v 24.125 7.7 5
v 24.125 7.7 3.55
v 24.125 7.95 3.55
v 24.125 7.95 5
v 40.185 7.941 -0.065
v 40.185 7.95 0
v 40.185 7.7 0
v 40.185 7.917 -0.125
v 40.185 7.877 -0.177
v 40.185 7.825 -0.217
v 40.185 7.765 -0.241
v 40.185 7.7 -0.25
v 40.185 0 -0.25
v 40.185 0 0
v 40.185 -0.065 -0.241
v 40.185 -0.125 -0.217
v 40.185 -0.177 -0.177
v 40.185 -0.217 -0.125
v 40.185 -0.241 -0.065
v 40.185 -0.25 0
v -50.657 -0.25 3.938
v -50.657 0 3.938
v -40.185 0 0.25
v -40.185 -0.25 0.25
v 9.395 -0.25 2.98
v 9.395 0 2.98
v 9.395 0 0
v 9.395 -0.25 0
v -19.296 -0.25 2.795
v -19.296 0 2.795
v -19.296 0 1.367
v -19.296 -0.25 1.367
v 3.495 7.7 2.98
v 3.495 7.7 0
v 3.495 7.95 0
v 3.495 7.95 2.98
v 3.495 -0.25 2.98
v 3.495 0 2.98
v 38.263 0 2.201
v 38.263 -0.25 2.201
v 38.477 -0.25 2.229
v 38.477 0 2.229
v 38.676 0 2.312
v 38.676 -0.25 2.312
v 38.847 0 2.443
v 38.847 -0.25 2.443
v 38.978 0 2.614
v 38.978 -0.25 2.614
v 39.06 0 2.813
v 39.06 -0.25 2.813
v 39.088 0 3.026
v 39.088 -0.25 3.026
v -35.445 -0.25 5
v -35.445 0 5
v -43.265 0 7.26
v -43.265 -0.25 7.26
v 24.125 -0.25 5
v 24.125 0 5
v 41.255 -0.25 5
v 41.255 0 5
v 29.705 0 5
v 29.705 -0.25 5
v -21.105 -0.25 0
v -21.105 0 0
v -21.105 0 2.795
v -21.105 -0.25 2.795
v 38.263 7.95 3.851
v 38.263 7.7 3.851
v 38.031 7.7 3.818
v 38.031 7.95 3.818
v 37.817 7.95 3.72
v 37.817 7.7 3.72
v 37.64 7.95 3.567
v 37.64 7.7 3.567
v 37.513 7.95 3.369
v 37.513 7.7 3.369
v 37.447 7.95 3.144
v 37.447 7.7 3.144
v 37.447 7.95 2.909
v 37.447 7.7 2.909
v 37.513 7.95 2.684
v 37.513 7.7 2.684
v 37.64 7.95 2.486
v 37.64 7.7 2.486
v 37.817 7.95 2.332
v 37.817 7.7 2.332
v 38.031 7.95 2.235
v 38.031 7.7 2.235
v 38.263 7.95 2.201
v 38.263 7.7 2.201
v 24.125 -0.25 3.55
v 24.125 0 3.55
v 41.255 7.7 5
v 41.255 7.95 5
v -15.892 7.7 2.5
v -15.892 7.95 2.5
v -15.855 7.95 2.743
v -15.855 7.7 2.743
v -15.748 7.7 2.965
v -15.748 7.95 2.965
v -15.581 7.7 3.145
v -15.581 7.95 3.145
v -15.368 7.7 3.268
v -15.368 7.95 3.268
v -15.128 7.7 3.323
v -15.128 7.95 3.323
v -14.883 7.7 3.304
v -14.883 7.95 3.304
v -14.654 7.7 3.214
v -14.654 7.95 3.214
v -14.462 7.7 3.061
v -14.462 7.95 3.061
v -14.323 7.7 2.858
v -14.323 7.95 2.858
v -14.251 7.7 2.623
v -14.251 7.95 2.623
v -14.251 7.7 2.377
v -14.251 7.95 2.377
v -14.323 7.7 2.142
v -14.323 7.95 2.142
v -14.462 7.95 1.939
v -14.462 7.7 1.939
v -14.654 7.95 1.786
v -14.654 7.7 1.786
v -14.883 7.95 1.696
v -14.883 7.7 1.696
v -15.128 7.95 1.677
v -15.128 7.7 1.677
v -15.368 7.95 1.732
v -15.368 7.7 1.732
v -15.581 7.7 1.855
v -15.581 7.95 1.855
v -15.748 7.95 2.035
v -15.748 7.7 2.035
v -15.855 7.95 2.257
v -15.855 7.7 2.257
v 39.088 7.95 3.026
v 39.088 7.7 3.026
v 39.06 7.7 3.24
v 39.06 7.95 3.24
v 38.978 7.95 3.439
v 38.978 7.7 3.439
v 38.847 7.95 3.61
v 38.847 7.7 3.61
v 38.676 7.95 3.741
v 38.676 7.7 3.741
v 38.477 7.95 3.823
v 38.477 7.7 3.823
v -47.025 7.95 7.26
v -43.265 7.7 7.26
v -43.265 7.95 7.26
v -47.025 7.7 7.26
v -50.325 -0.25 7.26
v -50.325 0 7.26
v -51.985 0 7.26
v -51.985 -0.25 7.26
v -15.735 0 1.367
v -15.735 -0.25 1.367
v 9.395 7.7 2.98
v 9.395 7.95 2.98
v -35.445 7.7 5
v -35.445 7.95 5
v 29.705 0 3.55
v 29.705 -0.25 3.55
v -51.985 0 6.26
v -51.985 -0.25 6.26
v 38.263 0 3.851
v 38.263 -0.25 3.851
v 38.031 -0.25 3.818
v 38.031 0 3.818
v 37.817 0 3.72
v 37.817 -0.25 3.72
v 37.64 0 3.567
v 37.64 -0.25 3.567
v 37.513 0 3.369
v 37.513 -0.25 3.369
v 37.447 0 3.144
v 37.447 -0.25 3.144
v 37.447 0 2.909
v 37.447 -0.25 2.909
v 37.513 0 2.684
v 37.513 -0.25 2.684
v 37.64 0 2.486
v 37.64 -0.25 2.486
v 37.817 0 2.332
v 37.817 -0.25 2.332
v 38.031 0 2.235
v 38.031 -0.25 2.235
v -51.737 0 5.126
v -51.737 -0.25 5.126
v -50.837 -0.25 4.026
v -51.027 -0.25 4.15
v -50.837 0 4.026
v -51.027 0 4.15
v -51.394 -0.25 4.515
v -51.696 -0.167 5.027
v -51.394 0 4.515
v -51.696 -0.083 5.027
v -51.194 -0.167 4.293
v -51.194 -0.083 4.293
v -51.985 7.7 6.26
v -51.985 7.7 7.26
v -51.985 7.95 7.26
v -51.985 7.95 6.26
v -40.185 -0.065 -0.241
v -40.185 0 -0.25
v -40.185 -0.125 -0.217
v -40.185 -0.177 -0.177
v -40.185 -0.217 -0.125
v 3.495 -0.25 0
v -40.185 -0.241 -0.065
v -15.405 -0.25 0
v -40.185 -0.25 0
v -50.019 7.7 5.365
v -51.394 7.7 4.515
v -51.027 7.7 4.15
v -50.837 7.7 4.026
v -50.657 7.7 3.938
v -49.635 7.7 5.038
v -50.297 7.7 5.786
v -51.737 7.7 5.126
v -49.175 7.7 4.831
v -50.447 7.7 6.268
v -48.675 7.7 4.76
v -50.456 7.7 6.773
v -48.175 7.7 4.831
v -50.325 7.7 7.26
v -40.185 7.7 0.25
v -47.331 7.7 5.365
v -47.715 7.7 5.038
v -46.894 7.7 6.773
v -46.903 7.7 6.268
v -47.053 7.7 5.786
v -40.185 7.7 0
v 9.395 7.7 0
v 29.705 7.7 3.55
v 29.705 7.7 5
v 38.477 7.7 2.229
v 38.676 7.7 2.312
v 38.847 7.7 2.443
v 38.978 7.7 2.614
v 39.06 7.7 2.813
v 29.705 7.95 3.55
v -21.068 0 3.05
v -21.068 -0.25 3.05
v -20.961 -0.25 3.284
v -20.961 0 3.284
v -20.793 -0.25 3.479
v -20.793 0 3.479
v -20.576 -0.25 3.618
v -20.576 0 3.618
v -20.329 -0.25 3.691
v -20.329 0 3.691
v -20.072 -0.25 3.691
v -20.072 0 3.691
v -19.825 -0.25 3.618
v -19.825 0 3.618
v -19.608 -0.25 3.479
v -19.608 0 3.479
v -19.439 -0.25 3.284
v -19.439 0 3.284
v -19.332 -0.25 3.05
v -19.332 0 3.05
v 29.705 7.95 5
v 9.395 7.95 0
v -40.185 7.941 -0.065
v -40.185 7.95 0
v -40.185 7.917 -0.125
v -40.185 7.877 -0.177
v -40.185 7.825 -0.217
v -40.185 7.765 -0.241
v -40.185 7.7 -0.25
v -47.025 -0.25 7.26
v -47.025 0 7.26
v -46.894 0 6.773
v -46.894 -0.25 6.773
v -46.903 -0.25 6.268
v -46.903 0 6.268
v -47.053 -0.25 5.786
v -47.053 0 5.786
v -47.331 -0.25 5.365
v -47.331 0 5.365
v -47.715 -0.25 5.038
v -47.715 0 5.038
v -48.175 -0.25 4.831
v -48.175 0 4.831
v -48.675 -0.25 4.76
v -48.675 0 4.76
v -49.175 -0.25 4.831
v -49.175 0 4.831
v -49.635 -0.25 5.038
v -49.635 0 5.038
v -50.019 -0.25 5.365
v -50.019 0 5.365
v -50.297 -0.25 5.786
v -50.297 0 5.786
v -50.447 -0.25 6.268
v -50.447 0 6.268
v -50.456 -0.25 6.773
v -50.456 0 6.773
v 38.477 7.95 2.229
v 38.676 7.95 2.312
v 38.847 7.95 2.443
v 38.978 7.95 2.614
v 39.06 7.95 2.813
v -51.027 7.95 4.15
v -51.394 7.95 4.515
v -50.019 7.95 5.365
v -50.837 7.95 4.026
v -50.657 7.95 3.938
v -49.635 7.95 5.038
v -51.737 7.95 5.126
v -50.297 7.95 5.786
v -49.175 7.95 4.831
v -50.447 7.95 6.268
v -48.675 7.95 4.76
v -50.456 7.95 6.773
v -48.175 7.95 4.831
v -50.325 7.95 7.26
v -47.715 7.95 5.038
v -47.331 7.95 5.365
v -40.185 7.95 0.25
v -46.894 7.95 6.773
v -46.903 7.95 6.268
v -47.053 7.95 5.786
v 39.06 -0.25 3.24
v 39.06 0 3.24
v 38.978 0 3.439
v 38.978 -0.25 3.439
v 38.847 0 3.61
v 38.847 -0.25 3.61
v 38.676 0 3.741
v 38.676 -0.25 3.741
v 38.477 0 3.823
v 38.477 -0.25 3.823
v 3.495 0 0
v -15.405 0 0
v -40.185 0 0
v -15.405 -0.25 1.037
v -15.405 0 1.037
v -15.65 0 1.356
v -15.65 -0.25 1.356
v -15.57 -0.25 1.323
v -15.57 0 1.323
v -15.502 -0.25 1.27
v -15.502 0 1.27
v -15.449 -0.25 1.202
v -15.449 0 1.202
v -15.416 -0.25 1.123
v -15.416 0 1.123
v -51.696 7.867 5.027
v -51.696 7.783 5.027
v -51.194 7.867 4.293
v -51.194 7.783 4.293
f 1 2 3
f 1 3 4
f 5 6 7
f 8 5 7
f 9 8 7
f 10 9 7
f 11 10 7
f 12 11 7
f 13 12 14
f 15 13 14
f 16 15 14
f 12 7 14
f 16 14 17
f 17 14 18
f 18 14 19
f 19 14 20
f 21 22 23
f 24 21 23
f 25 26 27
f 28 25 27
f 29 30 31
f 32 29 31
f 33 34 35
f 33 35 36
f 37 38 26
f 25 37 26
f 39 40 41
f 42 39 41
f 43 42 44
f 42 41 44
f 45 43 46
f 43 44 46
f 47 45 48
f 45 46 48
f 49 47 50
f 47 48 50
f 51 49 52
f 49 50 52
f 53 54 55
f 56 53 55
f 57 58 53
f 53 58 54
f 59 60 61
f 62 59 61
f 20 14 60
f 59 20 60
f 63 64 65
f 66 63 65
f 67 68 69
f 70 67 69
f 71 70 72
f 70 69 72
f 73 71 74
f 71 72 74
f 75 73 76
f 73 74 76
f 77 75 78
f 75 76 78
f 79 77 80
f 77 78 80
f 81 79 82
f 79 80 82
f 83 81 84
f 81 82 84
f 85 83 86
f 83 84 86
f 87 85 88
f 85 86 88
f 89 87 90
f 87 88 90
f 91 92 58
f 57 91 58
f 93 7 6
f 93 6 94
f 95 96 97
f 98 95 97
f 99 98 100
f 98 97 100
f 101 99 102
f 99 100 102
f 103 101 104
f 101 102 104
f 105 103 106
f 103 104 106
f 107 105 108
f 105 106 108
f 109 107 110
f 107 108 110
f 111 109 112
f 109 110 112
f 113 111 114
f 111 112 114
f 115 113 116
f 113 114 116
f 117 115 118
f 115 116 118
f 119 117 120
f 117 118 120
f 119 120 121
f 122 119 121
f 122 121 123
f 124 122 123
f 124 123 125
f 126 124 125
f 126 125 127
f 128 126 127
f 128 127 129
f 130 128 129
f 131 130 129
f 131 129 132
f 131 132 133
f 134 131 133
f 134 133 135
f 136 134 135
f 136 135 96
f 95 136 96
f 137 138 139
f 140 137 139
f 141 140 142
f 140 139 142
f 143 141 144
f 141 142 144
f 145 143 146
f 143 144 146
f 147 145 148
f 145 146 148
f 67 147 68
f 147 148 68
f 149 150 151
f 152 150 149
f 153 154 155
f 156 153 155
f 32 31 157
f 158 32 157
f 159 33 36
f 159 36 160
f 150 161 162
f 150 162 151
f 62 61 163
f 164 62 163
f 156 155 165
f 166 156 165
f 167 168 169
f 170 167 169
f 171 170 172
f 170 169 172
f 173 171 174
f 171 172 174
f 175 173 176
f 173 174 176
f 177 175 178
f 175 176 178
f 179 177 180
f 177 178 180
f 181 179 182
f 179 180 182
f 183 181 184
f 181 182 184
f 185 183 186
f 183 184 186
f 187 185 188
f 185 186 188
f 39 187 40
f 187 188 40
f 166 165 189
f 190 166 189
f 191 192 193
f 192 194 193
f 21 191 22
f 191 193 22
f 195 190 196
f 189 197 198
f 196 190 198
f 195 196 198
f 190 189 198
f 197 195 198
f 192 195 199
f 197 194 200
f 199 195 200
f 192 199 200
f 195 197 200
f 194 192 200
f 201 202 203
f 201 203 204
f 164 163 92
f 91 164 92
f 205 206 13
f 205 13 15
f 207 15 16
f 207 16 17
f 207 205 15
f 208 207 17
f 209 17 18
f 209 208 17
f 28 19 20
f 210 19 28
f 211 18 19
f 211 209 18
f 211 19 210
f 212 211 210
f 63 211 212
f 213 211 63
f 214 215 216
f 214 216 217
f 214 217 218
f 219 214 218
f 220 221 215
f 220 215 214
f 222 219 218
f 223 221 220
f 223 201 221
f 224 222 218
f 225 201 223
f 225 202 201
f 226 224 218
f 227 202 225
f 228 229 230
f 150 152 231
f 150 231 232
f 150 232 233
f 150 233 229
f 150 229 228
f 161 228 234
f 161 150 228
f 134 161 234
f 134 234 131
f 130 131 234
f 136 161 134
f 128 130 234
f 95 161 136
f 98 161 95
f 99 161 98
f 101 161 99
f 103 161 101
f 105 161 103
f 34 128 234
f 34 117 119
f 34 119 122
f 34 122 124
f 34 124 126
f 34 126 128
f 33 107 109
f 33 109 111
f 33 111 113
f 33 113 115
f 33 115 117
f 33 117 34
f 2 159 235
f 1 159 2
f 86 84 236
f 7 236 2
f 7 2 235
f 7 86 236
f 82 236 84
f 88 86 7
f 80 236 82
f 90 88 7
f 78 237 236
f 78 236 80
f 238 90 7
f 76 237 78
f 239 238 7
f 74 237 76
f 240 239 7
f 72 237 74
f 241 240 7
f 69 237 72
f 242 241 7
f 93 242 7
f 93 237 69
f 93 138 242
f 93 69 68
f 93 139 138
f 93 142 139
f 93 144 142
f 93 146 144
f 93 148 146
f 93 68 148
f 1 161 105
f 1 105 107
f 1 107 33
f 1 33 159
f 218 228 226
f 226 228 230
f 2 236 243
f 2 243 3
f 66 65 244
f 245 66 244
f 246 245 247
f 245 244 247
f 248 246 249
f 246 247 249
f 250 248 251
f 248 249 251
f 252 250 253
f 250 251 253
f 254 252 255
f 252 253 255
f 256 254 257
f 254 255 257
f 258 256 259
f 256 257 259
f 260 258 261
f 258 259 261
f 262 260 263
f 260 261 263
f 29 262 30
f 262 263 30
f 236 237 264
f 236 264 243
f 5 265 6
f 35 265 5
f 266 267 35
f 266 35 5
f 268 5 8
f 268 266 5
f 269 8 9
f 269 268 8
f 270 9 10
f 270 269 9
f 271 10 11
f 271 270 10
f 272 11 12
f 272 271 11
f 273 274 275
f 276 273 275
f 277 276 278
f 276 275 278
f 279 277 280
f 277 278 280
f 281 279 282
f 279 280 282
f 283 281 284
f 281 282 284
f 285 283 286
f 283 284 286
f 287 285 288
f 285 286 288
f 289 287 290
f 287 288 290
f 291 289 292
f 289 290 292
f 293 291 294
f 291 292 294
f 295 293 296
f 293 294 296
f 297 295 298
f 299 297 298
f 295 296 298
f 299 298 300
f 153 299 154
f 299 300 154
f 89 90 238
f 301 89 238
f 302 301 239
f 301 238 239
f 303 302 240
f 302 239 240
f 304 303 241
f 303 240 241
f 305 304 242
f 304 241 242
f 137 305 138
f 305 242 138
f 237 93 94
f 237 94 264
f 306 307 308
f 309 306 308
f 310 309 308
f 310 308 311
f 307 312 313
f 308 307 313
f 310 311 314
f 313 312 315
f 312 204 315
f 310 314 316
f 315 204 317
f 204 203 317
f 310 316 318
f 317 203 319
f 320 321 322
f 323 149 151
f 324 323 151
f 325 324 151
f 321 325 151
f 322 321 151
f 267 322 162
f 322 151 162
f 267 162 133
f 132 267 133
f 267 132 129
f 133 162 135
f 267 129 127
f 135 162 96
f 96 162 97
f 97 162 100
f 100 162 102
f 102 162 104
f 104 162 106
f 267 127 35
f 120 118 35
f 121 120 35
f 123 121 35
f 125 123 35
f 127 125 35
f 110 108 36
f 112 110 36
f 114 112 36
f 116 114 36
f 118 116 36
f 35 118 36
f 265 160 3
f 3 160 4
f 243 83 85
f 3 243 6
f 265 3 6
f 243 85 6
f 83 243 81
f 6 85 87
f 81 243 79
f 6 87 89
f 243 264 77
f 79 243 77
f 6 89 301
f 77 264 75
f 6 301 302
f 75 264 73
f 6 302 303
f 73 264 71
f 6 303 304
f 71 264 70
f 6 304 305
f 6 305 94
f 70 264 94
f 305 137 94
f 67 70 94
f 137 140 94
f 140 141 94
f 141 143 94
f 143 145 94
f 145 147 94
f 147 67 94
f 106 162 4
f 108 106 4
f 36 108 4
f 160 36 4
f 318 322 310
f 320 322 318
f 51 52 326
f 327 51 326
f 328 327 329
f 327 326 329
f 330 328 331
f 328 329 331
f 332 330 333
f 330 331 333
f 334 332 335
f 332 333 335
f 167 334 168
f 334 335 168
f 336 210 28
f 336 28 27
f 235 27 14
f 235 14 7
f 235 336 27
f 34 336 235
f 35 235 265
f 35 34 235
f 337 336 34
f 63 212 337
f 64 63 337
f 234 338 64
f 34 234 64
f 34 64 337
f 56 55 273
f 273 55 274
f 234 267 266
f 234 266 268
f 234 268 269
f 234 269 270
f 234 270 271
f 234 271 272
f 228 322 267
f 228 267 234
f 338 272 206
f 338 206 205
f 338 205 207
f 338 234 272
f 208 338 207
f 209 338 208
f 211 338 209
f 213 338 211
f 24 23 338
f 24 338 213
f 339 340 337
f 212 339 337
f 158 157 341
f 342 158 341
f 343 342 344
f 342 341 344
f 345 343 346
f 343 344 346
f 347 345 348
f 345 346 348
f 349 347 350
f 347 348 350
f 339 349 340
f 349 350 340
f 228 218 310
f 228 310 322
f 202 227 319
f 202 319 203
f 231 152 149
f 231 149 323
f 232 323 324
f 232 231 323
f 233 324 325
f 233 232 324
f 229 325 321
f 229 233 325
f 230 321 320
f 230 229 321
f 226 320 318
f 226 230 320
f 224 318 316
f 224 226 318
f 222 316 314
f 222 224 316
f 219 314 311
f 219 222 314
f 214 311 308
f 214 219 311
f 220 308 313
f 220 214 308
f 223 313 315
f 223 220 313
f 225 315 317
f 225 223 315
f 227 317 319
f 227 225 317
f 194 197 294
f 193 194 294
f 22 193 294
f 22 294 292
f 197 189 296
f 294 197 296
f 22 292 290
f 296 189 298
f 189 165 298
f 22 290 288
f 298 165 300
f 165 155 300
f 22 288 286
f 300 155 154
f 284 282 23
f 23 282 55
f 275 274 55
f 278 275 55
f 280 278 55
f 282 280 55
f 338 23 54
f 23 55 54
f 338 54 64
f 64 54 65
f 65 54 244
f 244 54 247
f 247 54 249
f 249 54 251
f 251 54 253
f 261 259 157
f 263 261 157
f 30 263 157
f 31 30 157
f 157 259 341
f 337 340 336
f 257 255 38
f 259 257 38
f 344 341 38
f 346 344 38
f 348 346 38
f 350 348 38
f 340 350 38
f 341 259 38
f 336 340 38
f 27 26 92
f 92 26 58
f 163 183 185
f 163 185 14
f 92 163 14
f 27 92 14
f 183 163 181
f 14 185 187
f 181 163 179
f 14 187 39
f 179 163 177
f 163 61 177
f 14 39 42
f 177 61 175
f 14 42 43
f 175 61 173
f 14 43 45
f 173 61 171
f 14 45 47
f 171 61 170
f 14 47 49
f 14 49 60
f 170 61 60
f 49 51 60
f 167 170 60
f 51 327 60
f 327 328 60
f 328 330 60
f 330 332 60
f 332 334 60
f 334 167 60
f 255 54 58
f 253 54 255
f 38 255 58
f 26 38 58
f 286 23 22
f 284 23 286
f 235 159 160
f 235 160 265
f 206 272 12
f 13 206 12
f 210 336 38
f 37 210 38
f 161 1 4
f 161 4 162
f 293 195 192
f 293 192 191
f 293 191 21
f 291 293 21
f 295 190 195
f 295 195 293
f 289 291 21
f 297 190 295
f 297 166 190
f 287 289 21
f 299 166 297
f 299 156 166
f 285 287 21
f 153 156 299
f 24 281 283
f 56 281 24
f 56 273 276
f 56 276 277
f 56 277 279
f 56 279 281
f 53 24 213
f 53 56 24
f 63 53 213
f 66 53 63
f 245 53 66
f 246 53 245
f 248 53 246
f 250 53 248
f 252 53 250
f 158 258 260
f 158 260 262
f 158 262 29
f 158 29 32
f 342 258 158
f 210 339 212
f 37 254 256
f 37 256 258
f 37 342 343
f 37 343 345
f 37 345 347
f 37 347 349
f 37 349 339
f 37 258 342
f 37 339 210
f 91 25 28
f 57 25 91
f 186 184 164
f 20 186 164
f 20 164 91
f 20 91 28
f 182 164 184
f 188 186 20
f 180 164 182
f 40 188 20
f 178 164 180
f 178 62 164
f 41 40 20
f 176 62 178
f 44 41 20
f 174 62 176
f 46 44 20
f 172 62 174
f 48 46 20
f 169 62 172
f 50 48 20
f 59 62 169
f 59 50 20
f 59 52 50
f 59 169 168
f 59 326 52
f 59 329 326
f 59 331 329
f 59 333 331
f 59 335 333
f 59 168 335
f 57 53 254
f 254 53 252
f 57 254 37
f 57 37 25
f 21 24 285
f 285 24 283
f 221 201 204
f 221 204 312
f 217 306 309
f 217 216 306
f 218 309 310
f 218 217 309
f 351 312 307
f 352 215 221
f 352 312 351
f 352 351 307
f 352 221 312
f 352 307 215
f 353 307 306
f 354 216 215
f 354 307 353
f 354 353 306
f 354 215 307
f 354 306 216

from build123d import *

# Parameters (mm, degrees)
F3_DEPTH  = 0.25
F4_DEPTH  = 0.25
F5_W      = 80.37
F5_H      = 7.7
F6_DEPTH  = 0.25
F8_DEPTH  = 80.37
F10_DEPTH = 80.37
F12_DEPTH = 8.2010001
F13_R     = 0.825
F14_DEPTH = 2


with BuildPart() as f3:
    # F0 (on Front) → F3 (new body)
    with BuildSketch(Plane.XZ):
        with BuildLine():
            Line((-40.185, 0.25), (-40.185, 0))
            Line((-40.185, 0), (-21.105, 0))
            Line((-21.105, 0), (-21.105, 2.7953359774))
            ThreePointArc((-21.105, 2.7953359774), (-20.2003359774, 3.7), (-19.2956719548, 2.7953359774))
            Line((-19.2956719548, 2.7953359774), (-19.2956719548, 1.3671361376))
            Line((-19.2956719548, 1.3671361376), (-15.7349420673, 1.3671361376))
            ThreePointArc((-15.7349420673, 1.3671361376), (-15.5016377941, 1.2704983434), (-15.405, 1.0371940702))
            Line((-15.405, 1.0371940702), (-15.405, 0))
            Line((-15.405, 0), (3.495, 0))
            Line((3.495, 0), (3.495, 2.98))
            Line((3.495, 2.98), (9.395, 2.98))
            Line((9.395, 2.98), (9.395, 0))
            Line((9.395, 0), (40.185, 0))
            Line((40.185, 0), (41.255, 5))
            Line((41.255, 5), (29.705, 5))
            Line((29.705, 5), (29.705, 3.55))
            Line((29.705, 3.55), (24.125, 3.55))
            Line((24.125, 3.55), (24.125, 5))
            Line((24.125, 5), (-35.445, 5))
            Line((-35.445, 5), (-43.265, 7.26))
            Line((-43.265, 7.26), (-47.025, 7.26))
            ThreePointArc((-47.025, 7.26), (-48.675, 4.76), (-50.325, 7.26))
            Line((-50.325, 7.26), (-51.985, 7.26))
            Line((-51.985, 7.26), (-51.985, 6.2604746746))
            add(Edge.make_bspline(
                [(-51.985, 6.2604746746), (-51.8611107918, 4.7384496413), (-51.1533093269, 4.1423325476), (-50.6568033495, 3.9383888915)],
                knots=[0.5835535338, 0.5835535338, 0.5835535338, 0.5835535338, 3.577318367, 3.577318367, 3.577318367, 3.577318367], degree=3))
            Line((-50.6568033495, 3.9383888915), (-40.185, 0.25))
        make_face()
    extrude(amount=F3_DEPTH)



with BuildPart() as f4:
    # F2 (on offset) → F4 (new body)
    with BuildSketch(Plane.XZ.offset(-7.7)):
        with BuildLine():
            Line((3.495, 2.98), (9.395, 2.98))
            Line((9.395, 2.98), (9.395, 0))
            Line((9.395, 0), (40.185, 0))
            Line((40.185, 0), (41.255, 5))
            Line((41.255, 5), (29.705, 5))
            Line((29.705, 5), (29.705, 3.55))
            Line((29.705, 3.55), (24.125, 3.55))
            Line((24.125, 3.55), (24.125, 5))
            Line((24.125, 5), (-35.445, 5))
            Line((-35.445, 5), (-43.265, 7.26))
            Line((-43.265, 7.26), (-47.025, 7.26))
            ThreePointArc((-47.025, 7.26), (-48.675, 4.76), (-50.325, 7.26))
            Line((-50.325, 7.26), (-51.985, 7.26))
            Line((-51.985, 7.26), (-51.985, 6.2604746746))
            add(Edge.make_bspline(
                [(-51.985, 6.2604746746), (-51.8611107918, 4.7384496413), (-51.1533093269, 4.1423325476), (-50.6568033495, 3.9383888915)],
                knots=[0.1631259715, 0.1631259715, 0.1631259715, 0.1631259715, 1, 1, 1, 1], degree=3))
            Line((-50.6568033495, 3.9383888915), (-40.185, 0.25))
            Line((-40.185, 0.25), (-40.185, 0))
            Line((-40.185, 0), (-21.105, 0))
            Line((-21.105, 0), (-15.405, 0))
            Line((-15.405, 0), (3.495, 0))
            Line((3.495, 0), (3.495, 2.98))
        make_face()
    extrude(amount=-F4_DEPTH)


with BuildPart() as f6:
    # F5 (on Top) → F6 (new body)
    with BuildSketch(Plane.XY):
        with Locations((0, 3.85)):
            Rectangle(F5_W, F5_H)
    extrude(amount=-F6_DEPTH)


with BuildPart() as f3_1:
    add(f3.part)

    add(f6.part)  # F8 merges F6
    # F7 (on face) → F8 (join, through all)
    with BuildSketch(Plane(origin=(-40.185, 0, 0), x_dir=(0, -1, 0), z_dir=(-1, 0, 0))):
        with BuildLine():
            Line((0, 0), (0, -0.25))
            ThreePointArc((0, -0.25), (0.1767766953, -0.1767766953), (0.25, 0))
            Line((0.25, 0), (0, 0))
        make_face()
    extrude(amount=-F8_DEPTH)


    add(f4.part)  # F10 merges F4
    # F9 (on face) → F10 (join, through all)
    with BuildSketch(Plane(origin=(-40.185, 0, 0), x_dir=(0, -1, 0), z_dir=(-1, 0, 0))):
        with BuildLine():
            Line((-7.7, 0), (-7.95, 0))
            ThreePointArc((-7.95, 0), (-7.8767766953, -0.1767766953), (-7.7, -0.25))
            Line((-7.7, -0.25), (-7.7, 0))
        make_face()
    extrude(amount=-F10_DEPTH)

    # F11 (on face) → F12 (cut, through all)
    with BuildSketch(Plane.XZ.offset(0.25)):
        with BuildLine():
            ThreePointArc((38.2632873952, 2.2013515081), (38.8466504897, 2.4429884136), (39.0882873952, 3.0263515081))
            ThreePointArc((39.0882873952, 3.0263515081), (38.8466504897, 3.6097146026), (38.2632873952, 3.8513515081))
            Line((38.2632873952, 3.8513515081), (38.2632873952, 2.2013515081))
        make_face()
        with BuildLine():
            Line((38.2632873952, 2.2013515081), (38.2632873952, 3.8513515081))
            ThreePointArc((38.2632873952, 3.8513515081), (37.4382873952, 3.0263515081), (38.2632873952, 2.2013515081))
        make_face()
    extrude(amount=-F12_DEPTH, mode=Mode.SUBTRACT)

    # F13 (on face) → F14 (cut)
    with BuildSketch(Plane(origin=(0, 7.95, 0), x_dir=(-1, 0, 0), z_dir=(0, 1, 0))):
        with Locations((15.0666469708, 2.5)):
            Circle(F13_R)
    extrude(amount=-F14_DEPTH, mode=Mode.SUBTRACT)


solid = f3_1.part
